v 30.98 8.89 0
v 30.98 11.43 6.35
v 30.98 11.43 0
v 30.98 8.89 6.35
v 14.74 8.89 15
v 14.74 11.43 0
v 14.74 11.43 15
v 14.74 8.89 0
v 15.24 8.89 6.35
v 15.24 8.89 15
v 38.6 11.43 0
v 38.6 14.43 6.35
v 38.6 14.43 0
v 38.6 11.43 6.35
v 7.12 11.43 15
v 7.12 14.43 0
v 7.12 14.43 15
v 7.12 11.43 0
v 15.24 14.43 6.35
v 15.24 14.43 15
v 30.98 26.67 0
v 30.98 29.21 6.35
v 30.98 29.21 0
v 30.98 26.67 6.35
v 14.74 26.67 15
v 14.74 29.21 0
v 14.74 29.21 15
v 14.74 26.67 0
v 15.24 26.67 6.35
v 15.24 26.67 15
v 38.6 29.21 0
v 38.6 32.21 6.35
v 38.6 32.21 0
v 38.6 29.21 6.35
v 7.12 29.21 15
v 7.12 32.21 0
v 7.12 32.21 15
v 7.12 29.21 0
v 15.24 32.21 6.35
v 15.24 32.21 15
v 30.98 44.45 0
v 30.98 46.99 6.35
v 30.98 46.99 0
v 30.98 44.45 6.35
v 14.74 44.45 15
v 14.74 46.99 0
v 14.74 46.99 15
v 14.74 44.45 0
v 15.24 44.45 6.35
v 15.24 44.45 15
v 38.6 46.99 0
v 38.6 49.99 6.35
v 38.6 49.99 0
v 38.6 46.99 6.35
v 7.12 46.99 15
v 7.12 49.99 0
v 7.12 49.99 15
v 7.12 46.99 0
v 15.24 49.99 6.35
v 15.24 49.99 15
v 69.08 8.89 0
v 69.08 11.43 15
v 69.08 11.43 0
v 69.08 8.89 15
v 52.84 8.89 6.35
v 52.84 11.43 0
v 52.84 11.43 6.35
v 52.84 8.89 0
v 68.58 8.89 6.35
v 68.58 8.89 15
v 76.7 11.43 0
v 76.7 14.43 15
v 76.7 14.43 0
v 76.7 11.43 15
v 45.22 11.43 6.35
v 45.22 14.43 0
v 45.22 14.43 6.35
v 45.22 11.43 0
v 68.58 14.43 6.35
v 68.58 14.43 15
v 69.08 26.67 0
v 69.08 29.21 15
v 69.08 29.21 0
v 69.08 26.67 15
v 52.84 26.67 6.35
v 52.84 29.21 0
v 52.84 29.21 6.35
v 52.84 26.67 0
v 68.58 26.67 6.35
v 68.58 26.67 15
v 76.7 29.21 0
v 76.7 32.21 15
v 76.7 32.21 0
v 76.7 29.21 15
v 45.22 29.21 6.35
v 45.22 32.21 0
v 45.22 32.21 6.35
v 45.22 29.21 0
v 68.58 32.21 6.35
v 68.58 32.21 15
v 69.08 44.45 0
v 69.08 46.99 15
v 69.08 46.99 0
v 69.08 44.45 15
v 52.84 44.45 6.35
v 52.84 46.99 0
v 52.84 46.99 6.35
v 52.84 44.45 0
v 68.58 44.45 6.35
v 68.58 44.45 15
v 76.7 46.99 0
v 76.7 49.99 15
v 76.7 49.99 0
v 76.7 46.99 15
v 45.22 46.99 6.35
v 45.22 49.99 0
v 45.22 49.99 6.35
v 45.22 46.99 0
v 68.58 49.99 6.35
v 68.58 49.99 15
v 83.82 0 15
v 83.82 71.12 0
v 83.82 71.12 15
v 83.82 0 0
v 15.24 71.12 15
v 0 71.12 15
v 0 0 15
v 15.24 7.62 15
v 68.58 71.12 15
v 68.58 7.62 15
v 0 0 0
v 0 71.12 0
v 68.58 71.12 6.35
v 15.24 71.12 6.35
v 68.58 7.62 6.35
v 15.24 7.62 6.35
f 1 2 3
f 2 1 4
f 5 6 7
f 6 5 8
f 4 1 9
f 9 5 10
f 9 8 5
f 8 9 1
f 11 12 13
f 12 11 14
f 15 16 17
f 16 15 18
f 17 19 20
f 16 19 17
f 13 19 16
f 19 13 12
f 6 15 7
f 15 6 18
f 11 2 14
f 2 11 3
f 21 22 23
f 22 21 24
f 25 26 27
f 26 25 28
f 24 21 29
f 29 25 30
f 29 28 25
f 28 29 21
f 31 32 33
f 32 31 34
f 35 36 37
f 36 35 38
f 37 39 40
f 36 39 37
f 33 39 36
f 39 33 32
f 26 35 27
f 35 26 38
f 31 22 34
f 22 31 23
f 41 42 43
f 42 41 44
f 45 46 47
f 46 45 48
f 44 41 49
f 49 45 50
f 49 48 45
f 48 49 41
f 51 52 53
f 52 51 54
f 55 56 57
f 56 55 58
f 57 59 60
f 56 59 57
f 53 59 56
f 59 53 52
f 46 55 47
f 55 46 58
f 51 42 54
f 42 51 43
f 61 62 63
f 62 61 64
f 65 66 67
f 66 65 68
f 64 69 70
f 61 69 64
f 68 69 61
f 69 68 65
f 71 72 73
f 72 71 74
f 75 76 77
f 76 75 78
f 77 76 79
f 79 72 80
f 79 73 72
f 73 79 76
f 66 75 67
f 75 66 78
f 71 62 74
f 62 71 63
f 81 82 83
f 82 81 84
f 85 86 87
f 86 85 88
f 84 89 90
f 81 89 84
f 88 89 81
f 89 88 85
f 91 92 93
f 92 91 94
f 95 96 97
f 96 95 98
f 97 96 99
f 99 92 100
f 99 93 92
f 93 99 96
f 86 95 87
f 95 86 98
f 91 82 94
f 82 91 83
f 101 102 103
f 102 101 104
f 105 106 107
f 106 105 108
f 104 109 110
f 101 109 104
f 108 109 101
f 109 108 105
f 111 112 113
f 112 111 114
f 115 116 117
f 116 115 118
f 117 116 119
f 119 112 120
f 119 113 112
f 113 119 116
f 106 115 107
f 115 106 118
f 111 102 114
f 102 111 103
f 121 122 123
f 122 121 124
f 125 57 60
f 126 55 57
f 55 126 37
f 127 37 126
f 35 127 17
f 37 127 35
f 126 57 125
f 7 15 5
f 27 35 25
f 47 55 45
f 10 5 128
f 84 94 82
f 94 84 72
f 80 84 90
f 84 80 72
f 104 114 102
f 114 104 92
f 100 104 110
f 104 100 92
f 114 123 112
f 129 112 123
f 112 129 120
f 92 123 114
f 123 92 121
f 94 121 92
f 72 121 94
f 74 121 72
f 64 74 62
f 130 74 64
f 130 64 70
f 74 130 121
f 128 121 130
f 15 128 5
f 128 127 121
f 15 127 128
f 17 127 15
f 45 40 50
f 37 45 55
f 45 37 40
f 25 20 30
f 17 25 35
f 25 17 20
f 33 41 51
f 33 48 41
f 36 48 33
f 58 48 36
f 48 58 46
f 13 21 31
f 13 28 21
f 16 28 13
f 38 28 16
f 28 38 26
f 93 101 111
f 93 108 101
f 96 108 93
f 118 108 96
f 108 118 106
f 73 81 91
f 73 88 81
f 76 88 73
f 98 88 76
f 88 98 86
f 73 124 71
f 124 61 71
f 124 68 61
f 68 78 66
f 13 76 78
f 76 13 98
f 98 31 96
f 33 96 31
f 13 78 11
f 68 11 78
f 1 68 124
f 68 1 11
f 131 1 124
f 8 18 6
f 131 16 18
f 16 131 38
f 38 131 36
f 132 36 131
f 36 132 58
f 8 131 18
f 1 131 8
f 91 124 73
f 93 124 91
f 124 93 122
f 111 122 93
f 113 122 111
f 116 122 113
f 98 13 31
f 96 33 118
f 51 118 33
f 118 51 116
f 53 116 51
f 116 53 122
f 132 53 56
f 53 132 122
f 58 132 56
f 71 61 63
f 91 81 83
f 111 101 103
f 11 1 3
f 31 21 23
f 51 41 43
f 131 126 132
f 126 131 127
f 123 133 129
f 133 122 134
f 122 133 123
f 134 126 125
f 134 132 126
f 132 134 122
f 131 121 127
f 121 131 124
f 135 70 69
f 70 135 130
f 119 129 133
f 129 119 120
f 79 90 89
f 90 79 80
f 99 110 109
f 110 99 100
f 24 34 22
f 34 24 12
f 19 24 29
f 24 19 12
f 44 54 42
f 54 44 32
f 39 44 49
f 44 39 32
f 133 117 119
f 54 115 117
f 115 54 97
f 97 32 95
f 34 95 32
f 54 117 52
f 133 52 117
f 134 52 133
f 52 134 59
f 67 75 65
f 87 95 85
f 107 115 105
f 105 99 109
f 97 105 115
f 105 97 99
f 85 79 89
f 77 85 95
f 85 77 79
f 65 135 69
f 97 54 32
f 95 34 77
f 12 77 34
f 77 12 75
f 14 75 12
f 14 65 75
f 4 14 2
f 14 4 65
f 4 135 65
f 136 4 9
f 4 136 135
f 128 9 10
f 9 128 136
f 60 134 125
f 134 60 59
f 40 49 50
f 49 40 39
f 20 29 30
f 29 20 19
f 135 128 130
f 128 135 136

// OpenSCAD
// file: clixxio_specs.scad
/*---------------------------------------------------------------------------*
* Sizes and constants for Clixx.IO Tabs
*---------------------------------------------------------------------------*/

TAB_WIDTH  = 10.16;    // Width of tabs in mm
TAB_HEIGHT = 2;        // Height of tab (circuit board depth)
TAB_DEPTH  = 8.89;     // Depth of tabs in mm

TWIN_TAB_GAP = 10.16; // Gap between the two tabs on a TwinTab board

TWIN_TAB_HEADER   = 6 * 2.54; // Width of the header for TwinTab boards
SINGLE_TAB_HEADER = 3 * 2.54; // Width of a header for SingleTab boards
HEADER_HEIGHT     = 1 * 2.54; // Height of headers
// main file
/*---------------------------------------------------------------------------*
* Casing for the prototype TwinTab x 6 dock.
*----------------------------------------------------------------------------*
* This generates the STL for a case to fit the stripboard prototype of the
* dock.
*---------------------------------------------------------------------------*/
include <clixxio_specs.scad>;

SLIPPAGE      = 0.5;          // Add this to allow for slippage
PITCH         = 2.54;         // Hole pitch (0.1")
BOUNDARY_TOP  = 0;            // Boundary to add at top (in pitch)
BOUNDARY_BOT  = 3;            // Bounadary to add at bottom (in pitch)
BOUNDARY_SIDE = 6;            // Boundary to add at sides (in pitch)
CASE_DEPTH    = 15;           // Total depth of the case
BOARD_WIDTH   = 21 * PITCH;   // Width of the PCB
BOARD_HEIGHT  = 25 * PITCH;   // Height of the PCB
SHELL_SIZE    = 2.5 * PITCH;  // Depth of the shell top

POSITIONS = [ // Position of each slot (in pitch)
  [ 0, 1 ],  [ 0, 8 ],  [ 0, 15 ],
  [ 15, 1 ], [ 15, 8 ], [ 15, 15 ],
  ];

/** Generate a shape that can be used to cut out space for the tab and header.
 *
 * x, y  - specify the co-ordinates of the top left hand side of the header.
 * depth - how deep to make the object (on the z axis)
 */
module TwinTabCutout(x, y, slip = SLIPPAGE, depth = 4) {
  translate(v = [ (TWIN_TAB_HEADER / 2) + x, slip + y, 0 ]) {
    union() {
      // Make the header
      cube(size = [ TWIN_TAB_HEADER + (2 * slip), HEADER_HEIGHT + (2 * slip), 2 * depth ], center = true);
      // Make space for the tabs
      translate(v = [ 0, (TAB_HEIGHT + HEADER_HEIGHT) / 2, 0 ]) {
        cube(size = [ (2 * TAB_WIDTH) + TWIN_TAB_GAP + (2 * slip), TAB_HEIGHT + (2 * slip), 2 * depth ], center = true);
        }
      }
    }
  }

/** Generate the main case
 */
module MainCase() {
  difference() {
    cube(size = [ (21 + BOUNDARY_SIDE * 2) * PITCH, (25 + BOUNDARY_TOP + BOUNDARY_BOT) * PITCH, CASE_DEPTH ], center = false);
    // Cut out space for the slots
    for(pos = POSITIONS) {
      TwinTabCutout((BOUNDARY_SIDE + pos[0]) * PITCH, (BOUNDARY_BOT + pos[1]) * PITCH, SLIPPAGE, CASE_DEPTH * 2);
      }
    // Create a gap for the circuit board
    translate(v = [ BOUNDARY_SIDE * PITCH, BOUNDARY_BOT * PITCH, SHELL_SIZE ]) {
      cube(size = [ BOARD_WIDTH, BOARD_HEIGHT + PITCH, CASE_DEPTH ], center = false);
      }
    }
  }

/** Case lid
 */
module CaseLid() {
  union() {
    intersection() {
      cube(size = [ 2 * BOARD_WIDTH, 2 * (BOARD_HEIGHT + PITCH), CASE_DEPTH - SHELL_SIZE - (2 * PITCH) ], center = false);
      for(pos = POSITIONS) {
        TwinTabCutout((BOUNDARY_SIDE + pos[0]) * PITCH, (BOUNDARY_BOT + pos[1]) * PITCH, 0, CASE_DEPTH);
        }
      }
    translate(v = [ BOUNDARY_SIDE * PITCH, BOUNDARY_BOT * PITCH, 0 ]) {
      cube(size = [ BOARD_WIDTH, BOARD_HEIGHT + PITCH, CASE_DEPTH - SHELL_SIZE - (2 * PITCH) ], center = false);
      }
    }
  }

MainCase();
// Comment out the above line and uncomment the following line for the lid.
// CaseLid();
